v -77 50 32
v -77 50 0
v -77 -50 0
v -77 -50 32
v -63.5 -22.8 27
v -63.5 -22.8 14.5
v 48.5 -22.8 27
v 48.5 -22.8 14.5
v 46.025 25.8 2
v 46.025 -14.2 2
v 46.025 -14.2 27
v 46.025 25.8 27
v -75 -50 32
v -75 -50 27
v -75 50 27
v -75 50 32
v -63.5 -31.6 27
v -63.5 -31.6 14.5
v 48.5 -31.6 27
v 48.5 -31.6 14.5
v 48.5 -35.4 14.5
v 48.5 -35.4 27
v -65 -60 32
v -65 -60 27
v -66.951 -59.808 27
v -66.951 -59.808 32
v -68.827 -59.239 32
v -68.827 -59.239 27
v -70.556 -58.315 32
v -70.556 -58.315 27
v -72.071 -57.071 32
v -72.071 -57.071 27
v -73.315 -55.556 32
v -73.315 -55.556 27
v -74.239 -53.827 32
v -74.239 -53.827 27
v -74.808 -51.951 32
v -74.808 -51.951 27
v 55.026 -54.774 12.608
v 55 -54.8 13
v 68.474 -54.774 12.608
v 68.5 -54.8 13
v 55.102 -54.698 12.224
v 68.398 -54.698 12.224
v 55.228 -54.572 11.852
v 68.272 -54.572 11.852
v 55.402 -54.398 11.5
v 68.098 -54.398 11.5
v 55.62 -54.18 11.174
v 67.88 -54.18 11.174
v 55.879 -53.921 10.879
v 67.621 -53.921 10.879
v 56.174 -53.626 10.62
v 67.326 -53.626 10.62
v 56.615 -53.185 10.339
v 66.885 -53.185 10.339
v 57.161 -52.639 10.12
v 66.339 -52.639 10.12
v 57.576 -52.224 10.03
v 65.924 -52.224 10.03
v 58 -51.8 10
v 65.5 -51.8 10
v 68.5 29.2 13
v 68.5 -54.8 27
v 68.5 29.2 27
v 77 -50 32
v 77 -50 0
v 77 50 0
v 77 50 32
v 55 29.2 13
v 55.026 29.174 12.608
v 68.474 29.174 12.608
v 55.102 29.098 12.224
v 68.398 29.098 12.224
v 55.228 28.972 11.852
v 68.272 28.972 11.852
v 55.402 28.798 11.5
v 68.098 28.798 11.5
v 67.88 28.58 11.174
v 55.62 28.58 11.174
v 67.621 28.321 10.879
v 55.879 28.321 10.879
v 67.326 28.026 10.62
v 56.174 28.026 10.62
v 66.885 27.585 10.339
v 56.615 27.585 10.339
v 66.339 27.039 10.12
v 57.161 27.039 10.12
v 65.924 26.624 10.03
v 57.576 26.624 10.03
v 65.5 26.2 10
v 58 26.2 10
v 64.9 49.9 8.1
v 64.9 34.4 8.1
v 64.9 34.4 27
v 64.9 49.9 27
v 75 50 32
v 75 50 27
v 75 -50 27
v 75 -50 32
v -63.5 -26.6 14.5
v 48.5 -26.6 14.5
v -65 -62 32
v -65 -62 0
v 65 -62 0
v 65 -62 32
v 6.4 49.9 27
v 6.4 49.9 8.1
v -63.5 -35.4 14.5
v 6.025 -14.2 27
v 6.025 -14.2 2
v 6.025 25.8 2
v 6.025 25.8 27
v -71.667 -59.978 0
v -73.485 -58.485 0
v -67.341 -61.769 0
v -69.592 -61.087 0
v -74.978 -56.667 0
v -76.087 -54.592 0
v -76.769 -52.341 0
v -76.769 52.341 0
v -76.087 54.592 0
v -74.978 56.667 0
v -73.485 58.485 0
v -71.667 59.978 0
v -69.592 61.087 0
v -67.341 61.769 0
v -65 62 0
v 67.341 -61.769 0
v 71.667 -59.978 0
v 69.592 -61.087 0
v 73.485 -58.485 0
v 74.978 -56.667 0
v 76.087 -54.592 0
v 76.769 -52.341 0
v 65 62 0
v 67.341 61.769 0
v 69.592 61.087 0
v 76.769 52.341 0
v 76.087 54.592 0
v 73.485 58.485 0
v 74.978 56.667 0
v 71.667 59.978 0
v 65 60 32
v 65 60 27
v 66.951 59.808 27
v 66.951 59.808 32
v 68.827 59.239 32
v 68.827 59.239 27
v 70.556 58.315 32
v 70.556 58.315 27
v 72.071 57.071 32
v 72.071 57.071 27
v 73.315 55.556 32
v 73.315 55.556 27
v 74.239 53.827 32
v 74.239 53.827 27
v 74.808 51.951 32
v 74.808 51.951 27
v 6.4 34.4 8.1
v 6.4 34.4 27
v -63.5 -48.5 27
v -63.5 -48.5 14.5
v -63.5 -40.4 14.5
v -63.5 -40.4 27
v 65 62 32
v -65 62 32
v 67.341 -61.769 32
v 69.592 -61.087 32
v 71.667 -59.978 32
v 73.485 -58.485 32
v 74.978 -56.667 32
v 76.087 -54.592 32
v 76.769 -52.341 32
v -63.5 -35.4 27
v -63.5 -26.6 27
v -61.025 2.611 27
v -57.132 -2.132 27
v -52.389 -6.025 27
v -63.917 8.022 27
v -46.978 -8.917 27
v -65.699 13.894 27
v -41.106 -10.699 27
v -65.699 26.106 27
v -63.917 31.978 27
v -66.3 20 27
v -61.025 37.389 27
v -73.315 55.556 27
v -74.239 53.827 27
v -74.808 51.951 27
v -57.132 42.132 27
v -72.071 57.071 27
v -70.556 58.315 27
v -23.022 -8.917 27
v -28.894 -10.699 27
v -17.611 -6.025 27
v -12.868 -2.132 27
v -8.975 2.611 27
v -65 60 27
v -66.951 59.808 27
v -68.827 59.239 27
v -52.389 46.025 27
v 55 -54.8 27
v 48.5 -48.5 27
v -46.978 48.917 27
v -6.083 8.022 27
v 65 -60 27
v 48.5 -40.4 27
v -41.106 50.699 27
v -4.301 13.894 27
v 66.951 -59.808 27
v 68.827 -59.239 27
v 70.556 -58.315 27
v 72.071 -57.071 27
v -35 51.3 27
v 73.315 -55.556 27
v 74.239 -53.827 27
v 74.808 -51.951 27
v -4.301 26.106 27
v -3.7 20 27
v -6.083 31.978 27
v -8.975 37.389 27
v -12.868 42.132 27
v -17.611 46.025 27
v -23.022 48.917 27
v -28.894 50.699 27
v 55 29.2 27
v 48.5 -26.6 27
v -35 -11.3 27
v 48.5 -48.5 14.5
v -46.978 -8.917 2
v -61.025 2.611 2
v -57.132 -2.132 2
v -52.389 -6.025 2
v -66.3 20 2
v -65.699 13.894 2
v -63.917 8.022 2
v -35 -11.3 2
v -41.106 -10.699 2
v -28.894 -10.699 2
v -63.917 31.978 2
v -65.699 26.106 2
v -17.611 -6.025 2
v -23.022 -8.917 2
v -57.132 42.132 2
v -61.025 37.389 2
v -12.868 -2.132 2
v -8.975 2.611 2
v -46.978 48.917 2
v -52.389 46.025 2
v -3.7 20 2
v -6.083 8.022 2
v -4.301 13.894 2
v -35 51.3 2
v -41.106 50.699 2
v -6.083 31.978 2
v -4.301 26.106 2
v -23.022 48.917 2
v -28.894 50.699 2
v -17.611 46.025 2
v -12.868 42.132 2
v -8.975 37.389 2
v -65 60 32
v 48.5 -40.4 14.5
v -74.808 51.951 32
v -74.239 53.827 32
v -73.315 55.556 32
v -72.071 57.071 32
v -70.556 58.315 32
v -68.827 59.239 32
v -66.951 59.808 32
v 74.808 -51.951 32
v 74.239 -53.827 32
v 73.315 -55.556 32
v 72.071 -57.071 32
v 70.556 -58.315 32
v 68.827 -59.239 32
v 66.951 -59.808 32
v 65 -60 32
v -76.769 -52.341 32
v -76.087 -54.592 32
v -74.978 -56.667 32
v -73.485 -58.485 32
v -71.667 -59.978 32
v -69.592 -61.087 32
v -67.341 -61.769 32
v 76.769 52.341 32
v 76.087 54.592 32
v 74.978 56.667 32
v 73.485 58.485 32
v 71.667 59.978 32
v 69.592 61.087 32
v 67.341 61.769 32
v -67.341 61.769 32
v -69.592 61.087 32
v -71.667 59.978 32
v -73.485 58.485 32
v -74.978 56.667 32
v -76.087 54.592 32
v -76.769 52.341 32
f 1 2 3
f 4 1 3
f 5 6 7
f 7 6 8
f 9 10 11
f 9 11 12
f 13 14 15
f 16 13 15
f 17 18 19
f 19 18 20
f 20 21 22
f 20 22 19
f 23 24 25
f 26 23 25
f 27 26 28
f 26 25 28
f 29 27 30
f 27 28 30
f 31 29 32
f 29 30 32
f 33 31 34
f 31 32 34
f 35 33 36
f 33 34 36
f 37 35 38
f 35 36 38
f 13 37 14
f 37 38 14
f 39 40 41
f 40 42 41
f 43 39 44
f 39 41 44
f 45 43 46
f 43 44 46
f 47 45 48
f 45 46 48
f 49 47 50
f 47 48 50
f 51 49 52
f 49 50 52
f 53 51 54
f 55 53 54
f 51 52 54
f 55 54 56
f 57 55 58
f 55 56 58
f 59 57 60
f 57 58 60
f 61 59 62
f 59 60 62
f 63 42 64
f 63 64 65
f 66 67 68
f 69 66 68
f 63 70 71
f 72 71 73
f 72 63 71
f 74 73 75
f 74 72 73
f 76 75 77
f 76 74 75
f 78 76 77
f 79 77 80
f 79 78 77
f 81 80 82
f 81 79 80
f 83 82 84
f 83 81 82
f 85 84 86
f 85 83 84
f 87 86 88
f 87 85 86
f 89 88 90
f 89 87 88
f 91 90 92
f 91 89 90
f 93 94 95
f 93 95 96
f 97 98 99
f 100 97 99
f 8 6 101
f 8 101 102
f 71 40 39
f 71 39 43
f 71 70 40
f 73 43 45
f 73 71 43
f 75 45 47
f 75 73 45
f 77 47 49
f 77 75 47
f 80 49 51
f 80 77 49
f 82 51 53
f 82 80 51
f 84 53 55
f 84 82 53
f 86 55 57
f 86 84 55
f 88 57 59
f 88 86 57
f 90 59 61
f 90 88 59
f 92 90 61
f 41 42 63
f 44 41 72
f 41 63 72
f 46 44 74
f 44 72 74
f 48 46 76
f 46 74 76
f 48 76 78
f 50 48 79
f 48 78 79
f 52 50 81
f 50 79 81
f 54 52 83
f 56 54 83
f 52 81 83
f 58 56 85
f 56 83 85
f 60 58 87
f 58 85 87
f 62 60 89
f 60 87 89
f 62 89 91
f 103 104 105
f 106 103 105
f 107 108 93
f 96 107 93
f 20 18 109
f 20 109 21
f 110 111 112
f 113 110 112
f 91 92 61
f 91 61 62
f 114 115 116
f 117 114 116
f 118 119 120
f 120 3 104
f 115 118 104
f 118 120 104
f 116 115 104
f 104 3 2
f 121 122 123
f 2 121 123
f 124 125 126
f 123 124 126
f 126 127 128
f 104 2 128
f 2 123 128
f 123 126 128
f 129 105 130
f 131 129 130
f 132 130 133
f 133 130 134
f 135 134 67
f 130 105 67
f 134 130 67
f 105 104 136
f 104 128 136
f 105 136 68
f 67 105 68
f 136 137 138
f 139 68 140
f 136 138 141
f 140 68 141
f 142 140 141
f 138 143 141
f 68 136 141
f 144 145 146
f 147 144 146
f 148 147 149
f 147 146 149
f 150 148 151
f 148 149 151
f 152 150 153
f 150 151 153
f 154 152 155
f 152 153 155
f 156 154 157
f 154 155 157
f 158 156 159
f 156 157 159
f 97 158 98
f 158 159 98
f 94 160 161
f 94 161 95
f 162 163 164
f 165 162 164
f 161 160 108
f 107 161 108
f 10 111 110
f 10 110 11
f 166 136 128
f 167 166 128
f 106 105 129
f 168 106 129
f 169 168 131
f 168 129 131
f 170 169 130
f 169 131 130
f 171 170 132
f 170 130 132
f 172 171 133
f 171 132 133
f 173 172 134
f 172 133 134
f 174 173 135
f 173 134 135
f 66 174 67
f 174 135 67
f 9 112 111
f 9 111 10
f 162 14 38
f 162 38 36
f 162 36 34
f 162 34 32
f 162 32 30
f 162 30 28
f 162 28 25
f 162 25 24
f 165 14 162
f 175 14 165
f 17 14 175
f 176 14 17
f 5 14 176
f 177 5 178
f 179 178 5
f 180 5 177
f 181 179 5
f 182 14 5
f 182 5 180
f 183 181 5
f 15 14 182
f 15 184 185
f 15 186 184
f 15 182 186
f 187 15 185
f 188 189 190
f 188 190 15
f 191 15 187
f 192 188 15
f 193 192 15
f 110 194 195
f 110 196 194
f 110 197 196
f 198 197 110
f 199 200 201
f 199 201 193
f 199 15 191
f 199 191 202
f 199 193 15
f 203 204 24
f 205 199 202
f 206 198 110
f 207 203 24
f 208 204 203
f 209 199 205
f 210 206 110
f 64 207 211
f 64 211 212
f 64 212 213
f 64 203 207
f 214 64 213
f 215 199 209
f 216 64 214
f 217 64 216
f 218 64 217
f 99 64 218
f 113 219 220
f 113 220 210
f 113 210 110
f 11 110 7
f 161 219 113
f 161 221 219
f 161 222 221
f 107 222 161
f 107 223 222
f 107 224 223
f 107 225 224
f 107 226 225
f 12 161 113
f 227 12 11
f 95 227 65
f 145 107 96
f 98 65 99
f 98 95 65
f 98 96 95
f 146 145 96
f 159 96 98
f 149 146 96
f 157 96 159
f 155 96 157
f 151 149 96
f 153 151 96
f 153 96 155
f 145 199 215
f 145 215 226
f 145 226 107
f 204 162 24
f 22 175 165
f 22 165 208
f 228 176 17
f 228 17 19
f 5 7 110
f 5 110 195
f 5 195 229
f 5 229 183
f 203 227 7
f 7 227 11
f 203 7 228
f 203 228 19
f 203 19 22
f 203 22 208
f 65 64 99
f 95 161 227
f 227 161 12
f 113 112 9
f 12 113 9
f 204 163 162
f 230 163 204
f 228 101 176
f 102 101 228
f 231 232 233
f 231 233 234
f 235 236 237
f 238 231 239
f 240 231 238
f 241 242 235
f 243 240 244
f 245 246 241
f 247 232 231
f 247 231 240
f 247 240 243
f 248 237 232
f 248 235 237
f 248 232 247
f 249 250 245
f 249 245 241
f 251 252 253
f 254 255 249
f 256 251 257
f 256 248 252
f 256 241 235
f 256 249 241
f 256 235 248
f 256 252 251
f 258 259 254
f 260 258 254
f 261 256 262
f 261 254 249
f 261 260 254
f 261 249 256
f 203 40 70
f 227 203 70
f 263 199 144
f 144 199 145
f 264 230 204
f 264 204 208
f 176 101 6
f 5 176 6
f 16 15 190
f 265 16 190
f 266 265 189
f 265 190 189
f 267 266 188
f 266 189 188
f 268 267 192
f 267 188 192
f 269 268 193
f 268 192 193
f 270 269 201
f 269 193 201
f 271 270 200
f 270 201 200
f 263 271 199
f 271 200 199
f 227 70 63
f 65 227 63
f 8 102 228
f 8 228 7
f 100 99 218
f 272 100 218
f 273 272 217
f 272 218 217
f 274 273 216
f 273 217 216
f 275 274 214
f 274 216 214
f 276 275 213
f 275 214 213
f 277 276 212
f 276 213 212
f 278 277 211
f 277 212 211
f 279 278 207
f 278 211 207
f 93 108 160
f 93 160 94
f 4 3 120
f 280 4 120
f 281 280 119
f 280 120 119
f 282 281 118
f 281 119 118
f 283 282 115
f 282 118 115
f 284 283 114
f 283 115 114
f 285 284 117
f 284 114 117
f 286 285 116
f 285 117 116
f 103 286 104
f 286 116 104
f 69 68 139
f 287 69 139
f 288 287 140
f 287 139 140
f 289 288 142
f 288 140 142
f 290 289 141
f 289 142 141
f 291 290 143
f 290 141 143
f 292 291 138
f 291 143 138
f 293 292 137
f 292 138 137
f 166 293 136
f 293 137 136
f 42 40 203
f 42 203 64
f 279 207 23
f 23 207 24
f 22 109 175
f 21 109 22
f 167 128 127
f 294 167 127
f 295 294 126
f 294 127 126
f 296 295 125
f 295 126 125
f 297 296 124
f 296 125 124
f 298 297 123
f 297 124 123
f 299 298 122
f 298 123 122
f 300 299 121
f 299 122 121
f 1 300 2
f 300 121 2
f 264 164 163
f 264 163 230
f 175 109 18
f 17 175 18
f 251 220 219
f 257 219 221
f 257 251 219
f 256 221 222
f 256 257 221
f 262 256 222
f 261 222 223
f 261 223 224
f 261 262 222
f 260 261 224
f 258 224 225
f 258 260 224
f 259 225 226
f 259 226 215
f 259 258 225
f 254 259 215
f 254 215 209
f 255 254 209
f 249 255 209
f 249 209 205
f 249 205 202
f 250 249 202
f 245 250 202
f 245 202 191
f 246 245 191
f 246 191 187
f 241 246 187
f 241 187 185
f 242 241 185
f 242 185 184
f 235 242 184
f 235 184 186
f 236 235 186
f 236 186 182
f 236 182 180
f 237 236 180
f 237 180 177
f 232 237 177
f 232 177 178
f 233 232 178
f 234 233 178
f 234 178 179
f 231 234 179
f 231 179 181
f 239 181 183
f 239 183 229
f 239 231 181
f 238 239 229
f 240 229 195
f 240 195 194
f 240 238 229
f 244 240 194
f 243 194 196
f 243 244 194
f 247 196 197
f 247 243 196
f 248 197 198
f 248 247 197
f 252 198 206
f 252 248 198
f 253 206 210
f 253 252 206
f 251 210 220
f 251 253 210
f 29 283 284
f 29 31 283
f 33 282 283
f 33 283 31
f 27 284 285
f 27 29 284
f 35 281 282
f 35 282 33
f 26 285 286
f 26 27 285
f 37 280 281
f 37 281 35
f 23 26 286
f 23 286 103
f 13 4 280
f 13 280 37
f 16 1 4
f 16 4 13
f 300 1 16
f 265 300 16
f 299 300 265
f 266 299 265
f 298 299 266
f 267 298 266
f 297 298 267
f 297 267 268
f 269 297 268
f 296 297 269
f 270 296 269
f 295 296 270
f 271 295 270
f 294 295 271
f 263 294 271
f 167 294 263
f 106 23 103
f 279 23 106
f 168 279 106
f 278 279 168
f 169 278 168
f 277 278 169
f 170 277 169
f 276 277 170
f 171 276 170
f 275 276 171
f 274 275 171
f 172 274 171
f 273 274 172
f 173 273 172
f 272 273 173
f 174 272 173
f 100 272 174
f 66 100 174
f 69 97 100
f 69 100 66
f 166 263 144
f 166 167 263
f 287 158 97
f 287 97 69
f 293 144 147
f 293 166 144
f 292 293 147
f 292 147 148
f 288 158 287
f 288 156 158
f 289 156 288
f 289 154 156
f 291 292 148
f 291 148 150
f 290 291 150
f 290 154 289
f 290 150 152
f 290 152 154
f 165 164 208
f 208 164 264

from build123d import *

# Parameters (mm, degrees)
F1_DEPTH = 32
F0_W     = 112
F0_H     = 8.1
F0_H_2   = 3.8
F0_W_2   = 13.5
F0_H_3   = 84
F0_R     = 31.3
F0_W_3   = 40
F0_H_4   = 40
F0_W_4   = 58.5
F0_H_5   = 15.5
F2_DEPTH = 27
F3_DEPTH = 2
F4_DEPTH = 8.1
F5_DEPTH = 10
F6_R     = 3
F7_DEPTH = 14.5
F8_DEPTH = 2


with BuildPart() as f1:
    # F0 (on Top) → F1 (new body)
    with BuildSketch(Plane.XY):
        with BuildLine():
            Line((65, 62), (-65, 62))
            ThreePointArc((-65, 62), (-73.4852813742, 58.4852813742), (-77, 50))
            Line((-77, 50), (-77, -50))
            ThreePointArc((-77, -50), (-73.4852813742, -58.4852813742), (-65, -62))
            Line((-65, -62), (65, -62))
            ThreePointArc((65, -62), (73.4852813742, -58.4852813742), (77, -50))
            Line((77, -50), (77, 50))
            ThreePointArc((77, 50), (73.4852813742, 58.4852813742), (65, 62))
        make_face()
        with BuildLine():
            ThreePointArc((-75, 50), (-72.0710678119, 57.0710678119), (-65, 60))
            Line((-65, 60), (65, 60))
            ThreePointArc((65, 60), (72.0710678119, 57.0710678119), (75, 50))
            Line((75, 50), (75, -50))
            ThreePointArc((75, -50), (72.0710678119, -57.0710678119), (65, -60))
            Line((65, -60), (-65, -60))
            ThreePointArc((-65, -60), (-72.0710678119, -57.0710678119), (-75, -50))
            Line((-75, -50), (-75, 50))
        make_face(mode=Mode.SUBTRACT)
    extrude(amount=F1_DEPTH)

    # F0 (on Top) → F2 (join)
    with BuildSketch(Plane.XY):
        with BuildLine():
            Line((65, 60), (-65, 60))
            ThreePointArc((-65, 60), (-72.0710678119, 57.0710678119), (-75, 50))
            Line((-75, 50), (-75, -50))
            ThreePointArc((-75, -50), (-72.0710678119, -57.0710678119), (-65, -60))
            Line((-65, -60), (65, -60))
            ThreePointArc((65, -60), (72.0710678119, -57.0710678119), (75, -50))
            Line((75, -50), (75, 50))
            ThreePointArc((75, 50), (72.0710678119, 57.0710678119), (65, 60))
        make_face()
        with Locations((-7.5, -44.45)):
            Rectangle(F0_W, F0_H, mode=Mode.SUBTRACT)
        with Locations((-7.5, -33.5)):
            Rectangle(F0_W, F0_H_2, mode=Mode.SUBTRACT)
        with Locations((-7.5, -24.7)):
            Rectangle(F0_W, F0_H_2, mode=Mode.SUBTRACT)
        with Locations((61.75, -12.8)):
            Rectangle(F0_W_2, F0_H_3, mode=Mode.SUBTRACT)
        with Locations((-35, 20)):
            Circle(F0_R, mode=Mode.SUBTRACT)
        with Locations((26.025, 5.8)):
            Rectangle(F0_W_3, F0_H_4, mode=Mode.SUBTRACT)
        with Locations((35.65, 42.15)):
            Rectangle(F0_W_4, F0_H_5, mode=Mode.SUBTRACT)
    extrude(amount=F2_DEPTH)

    # F0 (on Top) → F3 (join)
    with BuildSketch(Plane.XY):
        with Locations((-35, 20)):
            Circle(F0_R)
    extrude(amount=F3_DEPTH)

    # F0 (on Top) → F4 (join)
    with BuildSketch(Plane.XY):
        with Locations((35.65, 42.15)):
            Rectangle(F0_W_4, F0_H_5)
    extrude(amount=F4_DEPTH)

    # F0 (on Top) → F5 (join)
    with BuildSketch(Plane.XY):
        with Locations((61.75, -12.8)):
            Rectangle(F0_W_2, F0_H_3)
    extrude(amount=F5_DEPTH)

    # F6
    f6_edges = [f1.edges().sort_by_distance(p)[0] for p in [
        (55, -12.8, 10),
        (61.75, -54.8, 10),
        (68.5, -12.8, 10),
        (61.75, 29.2, 10),
    ]]
    fillet(f6_edges, radius=F6_R)

    # F0 (on Top) → F7 (join)
    with BuildSketch(Plane.XY):
        with Locations((-7.5, -44.45)):
            Rectangle(F0_W, F0_H)
        with Locations((-7.5, -33.5)):
            Rectangle(F0_W, F0_H_2)
        with Locations((-7.5, -24.7)):
            Rectangle(F0_W, F0_H_2)
    extrude(amount=F7_DEPTH)

    # F0 (on Top) → F8 (join)
    with BuildSketch(Plane.XY):
        with Locations((26.025, 5.8)):
            Rectangle(F0_W_3, F0_H_4)
    extrude(amount=F8_DEPTH)


solid = f1.part
